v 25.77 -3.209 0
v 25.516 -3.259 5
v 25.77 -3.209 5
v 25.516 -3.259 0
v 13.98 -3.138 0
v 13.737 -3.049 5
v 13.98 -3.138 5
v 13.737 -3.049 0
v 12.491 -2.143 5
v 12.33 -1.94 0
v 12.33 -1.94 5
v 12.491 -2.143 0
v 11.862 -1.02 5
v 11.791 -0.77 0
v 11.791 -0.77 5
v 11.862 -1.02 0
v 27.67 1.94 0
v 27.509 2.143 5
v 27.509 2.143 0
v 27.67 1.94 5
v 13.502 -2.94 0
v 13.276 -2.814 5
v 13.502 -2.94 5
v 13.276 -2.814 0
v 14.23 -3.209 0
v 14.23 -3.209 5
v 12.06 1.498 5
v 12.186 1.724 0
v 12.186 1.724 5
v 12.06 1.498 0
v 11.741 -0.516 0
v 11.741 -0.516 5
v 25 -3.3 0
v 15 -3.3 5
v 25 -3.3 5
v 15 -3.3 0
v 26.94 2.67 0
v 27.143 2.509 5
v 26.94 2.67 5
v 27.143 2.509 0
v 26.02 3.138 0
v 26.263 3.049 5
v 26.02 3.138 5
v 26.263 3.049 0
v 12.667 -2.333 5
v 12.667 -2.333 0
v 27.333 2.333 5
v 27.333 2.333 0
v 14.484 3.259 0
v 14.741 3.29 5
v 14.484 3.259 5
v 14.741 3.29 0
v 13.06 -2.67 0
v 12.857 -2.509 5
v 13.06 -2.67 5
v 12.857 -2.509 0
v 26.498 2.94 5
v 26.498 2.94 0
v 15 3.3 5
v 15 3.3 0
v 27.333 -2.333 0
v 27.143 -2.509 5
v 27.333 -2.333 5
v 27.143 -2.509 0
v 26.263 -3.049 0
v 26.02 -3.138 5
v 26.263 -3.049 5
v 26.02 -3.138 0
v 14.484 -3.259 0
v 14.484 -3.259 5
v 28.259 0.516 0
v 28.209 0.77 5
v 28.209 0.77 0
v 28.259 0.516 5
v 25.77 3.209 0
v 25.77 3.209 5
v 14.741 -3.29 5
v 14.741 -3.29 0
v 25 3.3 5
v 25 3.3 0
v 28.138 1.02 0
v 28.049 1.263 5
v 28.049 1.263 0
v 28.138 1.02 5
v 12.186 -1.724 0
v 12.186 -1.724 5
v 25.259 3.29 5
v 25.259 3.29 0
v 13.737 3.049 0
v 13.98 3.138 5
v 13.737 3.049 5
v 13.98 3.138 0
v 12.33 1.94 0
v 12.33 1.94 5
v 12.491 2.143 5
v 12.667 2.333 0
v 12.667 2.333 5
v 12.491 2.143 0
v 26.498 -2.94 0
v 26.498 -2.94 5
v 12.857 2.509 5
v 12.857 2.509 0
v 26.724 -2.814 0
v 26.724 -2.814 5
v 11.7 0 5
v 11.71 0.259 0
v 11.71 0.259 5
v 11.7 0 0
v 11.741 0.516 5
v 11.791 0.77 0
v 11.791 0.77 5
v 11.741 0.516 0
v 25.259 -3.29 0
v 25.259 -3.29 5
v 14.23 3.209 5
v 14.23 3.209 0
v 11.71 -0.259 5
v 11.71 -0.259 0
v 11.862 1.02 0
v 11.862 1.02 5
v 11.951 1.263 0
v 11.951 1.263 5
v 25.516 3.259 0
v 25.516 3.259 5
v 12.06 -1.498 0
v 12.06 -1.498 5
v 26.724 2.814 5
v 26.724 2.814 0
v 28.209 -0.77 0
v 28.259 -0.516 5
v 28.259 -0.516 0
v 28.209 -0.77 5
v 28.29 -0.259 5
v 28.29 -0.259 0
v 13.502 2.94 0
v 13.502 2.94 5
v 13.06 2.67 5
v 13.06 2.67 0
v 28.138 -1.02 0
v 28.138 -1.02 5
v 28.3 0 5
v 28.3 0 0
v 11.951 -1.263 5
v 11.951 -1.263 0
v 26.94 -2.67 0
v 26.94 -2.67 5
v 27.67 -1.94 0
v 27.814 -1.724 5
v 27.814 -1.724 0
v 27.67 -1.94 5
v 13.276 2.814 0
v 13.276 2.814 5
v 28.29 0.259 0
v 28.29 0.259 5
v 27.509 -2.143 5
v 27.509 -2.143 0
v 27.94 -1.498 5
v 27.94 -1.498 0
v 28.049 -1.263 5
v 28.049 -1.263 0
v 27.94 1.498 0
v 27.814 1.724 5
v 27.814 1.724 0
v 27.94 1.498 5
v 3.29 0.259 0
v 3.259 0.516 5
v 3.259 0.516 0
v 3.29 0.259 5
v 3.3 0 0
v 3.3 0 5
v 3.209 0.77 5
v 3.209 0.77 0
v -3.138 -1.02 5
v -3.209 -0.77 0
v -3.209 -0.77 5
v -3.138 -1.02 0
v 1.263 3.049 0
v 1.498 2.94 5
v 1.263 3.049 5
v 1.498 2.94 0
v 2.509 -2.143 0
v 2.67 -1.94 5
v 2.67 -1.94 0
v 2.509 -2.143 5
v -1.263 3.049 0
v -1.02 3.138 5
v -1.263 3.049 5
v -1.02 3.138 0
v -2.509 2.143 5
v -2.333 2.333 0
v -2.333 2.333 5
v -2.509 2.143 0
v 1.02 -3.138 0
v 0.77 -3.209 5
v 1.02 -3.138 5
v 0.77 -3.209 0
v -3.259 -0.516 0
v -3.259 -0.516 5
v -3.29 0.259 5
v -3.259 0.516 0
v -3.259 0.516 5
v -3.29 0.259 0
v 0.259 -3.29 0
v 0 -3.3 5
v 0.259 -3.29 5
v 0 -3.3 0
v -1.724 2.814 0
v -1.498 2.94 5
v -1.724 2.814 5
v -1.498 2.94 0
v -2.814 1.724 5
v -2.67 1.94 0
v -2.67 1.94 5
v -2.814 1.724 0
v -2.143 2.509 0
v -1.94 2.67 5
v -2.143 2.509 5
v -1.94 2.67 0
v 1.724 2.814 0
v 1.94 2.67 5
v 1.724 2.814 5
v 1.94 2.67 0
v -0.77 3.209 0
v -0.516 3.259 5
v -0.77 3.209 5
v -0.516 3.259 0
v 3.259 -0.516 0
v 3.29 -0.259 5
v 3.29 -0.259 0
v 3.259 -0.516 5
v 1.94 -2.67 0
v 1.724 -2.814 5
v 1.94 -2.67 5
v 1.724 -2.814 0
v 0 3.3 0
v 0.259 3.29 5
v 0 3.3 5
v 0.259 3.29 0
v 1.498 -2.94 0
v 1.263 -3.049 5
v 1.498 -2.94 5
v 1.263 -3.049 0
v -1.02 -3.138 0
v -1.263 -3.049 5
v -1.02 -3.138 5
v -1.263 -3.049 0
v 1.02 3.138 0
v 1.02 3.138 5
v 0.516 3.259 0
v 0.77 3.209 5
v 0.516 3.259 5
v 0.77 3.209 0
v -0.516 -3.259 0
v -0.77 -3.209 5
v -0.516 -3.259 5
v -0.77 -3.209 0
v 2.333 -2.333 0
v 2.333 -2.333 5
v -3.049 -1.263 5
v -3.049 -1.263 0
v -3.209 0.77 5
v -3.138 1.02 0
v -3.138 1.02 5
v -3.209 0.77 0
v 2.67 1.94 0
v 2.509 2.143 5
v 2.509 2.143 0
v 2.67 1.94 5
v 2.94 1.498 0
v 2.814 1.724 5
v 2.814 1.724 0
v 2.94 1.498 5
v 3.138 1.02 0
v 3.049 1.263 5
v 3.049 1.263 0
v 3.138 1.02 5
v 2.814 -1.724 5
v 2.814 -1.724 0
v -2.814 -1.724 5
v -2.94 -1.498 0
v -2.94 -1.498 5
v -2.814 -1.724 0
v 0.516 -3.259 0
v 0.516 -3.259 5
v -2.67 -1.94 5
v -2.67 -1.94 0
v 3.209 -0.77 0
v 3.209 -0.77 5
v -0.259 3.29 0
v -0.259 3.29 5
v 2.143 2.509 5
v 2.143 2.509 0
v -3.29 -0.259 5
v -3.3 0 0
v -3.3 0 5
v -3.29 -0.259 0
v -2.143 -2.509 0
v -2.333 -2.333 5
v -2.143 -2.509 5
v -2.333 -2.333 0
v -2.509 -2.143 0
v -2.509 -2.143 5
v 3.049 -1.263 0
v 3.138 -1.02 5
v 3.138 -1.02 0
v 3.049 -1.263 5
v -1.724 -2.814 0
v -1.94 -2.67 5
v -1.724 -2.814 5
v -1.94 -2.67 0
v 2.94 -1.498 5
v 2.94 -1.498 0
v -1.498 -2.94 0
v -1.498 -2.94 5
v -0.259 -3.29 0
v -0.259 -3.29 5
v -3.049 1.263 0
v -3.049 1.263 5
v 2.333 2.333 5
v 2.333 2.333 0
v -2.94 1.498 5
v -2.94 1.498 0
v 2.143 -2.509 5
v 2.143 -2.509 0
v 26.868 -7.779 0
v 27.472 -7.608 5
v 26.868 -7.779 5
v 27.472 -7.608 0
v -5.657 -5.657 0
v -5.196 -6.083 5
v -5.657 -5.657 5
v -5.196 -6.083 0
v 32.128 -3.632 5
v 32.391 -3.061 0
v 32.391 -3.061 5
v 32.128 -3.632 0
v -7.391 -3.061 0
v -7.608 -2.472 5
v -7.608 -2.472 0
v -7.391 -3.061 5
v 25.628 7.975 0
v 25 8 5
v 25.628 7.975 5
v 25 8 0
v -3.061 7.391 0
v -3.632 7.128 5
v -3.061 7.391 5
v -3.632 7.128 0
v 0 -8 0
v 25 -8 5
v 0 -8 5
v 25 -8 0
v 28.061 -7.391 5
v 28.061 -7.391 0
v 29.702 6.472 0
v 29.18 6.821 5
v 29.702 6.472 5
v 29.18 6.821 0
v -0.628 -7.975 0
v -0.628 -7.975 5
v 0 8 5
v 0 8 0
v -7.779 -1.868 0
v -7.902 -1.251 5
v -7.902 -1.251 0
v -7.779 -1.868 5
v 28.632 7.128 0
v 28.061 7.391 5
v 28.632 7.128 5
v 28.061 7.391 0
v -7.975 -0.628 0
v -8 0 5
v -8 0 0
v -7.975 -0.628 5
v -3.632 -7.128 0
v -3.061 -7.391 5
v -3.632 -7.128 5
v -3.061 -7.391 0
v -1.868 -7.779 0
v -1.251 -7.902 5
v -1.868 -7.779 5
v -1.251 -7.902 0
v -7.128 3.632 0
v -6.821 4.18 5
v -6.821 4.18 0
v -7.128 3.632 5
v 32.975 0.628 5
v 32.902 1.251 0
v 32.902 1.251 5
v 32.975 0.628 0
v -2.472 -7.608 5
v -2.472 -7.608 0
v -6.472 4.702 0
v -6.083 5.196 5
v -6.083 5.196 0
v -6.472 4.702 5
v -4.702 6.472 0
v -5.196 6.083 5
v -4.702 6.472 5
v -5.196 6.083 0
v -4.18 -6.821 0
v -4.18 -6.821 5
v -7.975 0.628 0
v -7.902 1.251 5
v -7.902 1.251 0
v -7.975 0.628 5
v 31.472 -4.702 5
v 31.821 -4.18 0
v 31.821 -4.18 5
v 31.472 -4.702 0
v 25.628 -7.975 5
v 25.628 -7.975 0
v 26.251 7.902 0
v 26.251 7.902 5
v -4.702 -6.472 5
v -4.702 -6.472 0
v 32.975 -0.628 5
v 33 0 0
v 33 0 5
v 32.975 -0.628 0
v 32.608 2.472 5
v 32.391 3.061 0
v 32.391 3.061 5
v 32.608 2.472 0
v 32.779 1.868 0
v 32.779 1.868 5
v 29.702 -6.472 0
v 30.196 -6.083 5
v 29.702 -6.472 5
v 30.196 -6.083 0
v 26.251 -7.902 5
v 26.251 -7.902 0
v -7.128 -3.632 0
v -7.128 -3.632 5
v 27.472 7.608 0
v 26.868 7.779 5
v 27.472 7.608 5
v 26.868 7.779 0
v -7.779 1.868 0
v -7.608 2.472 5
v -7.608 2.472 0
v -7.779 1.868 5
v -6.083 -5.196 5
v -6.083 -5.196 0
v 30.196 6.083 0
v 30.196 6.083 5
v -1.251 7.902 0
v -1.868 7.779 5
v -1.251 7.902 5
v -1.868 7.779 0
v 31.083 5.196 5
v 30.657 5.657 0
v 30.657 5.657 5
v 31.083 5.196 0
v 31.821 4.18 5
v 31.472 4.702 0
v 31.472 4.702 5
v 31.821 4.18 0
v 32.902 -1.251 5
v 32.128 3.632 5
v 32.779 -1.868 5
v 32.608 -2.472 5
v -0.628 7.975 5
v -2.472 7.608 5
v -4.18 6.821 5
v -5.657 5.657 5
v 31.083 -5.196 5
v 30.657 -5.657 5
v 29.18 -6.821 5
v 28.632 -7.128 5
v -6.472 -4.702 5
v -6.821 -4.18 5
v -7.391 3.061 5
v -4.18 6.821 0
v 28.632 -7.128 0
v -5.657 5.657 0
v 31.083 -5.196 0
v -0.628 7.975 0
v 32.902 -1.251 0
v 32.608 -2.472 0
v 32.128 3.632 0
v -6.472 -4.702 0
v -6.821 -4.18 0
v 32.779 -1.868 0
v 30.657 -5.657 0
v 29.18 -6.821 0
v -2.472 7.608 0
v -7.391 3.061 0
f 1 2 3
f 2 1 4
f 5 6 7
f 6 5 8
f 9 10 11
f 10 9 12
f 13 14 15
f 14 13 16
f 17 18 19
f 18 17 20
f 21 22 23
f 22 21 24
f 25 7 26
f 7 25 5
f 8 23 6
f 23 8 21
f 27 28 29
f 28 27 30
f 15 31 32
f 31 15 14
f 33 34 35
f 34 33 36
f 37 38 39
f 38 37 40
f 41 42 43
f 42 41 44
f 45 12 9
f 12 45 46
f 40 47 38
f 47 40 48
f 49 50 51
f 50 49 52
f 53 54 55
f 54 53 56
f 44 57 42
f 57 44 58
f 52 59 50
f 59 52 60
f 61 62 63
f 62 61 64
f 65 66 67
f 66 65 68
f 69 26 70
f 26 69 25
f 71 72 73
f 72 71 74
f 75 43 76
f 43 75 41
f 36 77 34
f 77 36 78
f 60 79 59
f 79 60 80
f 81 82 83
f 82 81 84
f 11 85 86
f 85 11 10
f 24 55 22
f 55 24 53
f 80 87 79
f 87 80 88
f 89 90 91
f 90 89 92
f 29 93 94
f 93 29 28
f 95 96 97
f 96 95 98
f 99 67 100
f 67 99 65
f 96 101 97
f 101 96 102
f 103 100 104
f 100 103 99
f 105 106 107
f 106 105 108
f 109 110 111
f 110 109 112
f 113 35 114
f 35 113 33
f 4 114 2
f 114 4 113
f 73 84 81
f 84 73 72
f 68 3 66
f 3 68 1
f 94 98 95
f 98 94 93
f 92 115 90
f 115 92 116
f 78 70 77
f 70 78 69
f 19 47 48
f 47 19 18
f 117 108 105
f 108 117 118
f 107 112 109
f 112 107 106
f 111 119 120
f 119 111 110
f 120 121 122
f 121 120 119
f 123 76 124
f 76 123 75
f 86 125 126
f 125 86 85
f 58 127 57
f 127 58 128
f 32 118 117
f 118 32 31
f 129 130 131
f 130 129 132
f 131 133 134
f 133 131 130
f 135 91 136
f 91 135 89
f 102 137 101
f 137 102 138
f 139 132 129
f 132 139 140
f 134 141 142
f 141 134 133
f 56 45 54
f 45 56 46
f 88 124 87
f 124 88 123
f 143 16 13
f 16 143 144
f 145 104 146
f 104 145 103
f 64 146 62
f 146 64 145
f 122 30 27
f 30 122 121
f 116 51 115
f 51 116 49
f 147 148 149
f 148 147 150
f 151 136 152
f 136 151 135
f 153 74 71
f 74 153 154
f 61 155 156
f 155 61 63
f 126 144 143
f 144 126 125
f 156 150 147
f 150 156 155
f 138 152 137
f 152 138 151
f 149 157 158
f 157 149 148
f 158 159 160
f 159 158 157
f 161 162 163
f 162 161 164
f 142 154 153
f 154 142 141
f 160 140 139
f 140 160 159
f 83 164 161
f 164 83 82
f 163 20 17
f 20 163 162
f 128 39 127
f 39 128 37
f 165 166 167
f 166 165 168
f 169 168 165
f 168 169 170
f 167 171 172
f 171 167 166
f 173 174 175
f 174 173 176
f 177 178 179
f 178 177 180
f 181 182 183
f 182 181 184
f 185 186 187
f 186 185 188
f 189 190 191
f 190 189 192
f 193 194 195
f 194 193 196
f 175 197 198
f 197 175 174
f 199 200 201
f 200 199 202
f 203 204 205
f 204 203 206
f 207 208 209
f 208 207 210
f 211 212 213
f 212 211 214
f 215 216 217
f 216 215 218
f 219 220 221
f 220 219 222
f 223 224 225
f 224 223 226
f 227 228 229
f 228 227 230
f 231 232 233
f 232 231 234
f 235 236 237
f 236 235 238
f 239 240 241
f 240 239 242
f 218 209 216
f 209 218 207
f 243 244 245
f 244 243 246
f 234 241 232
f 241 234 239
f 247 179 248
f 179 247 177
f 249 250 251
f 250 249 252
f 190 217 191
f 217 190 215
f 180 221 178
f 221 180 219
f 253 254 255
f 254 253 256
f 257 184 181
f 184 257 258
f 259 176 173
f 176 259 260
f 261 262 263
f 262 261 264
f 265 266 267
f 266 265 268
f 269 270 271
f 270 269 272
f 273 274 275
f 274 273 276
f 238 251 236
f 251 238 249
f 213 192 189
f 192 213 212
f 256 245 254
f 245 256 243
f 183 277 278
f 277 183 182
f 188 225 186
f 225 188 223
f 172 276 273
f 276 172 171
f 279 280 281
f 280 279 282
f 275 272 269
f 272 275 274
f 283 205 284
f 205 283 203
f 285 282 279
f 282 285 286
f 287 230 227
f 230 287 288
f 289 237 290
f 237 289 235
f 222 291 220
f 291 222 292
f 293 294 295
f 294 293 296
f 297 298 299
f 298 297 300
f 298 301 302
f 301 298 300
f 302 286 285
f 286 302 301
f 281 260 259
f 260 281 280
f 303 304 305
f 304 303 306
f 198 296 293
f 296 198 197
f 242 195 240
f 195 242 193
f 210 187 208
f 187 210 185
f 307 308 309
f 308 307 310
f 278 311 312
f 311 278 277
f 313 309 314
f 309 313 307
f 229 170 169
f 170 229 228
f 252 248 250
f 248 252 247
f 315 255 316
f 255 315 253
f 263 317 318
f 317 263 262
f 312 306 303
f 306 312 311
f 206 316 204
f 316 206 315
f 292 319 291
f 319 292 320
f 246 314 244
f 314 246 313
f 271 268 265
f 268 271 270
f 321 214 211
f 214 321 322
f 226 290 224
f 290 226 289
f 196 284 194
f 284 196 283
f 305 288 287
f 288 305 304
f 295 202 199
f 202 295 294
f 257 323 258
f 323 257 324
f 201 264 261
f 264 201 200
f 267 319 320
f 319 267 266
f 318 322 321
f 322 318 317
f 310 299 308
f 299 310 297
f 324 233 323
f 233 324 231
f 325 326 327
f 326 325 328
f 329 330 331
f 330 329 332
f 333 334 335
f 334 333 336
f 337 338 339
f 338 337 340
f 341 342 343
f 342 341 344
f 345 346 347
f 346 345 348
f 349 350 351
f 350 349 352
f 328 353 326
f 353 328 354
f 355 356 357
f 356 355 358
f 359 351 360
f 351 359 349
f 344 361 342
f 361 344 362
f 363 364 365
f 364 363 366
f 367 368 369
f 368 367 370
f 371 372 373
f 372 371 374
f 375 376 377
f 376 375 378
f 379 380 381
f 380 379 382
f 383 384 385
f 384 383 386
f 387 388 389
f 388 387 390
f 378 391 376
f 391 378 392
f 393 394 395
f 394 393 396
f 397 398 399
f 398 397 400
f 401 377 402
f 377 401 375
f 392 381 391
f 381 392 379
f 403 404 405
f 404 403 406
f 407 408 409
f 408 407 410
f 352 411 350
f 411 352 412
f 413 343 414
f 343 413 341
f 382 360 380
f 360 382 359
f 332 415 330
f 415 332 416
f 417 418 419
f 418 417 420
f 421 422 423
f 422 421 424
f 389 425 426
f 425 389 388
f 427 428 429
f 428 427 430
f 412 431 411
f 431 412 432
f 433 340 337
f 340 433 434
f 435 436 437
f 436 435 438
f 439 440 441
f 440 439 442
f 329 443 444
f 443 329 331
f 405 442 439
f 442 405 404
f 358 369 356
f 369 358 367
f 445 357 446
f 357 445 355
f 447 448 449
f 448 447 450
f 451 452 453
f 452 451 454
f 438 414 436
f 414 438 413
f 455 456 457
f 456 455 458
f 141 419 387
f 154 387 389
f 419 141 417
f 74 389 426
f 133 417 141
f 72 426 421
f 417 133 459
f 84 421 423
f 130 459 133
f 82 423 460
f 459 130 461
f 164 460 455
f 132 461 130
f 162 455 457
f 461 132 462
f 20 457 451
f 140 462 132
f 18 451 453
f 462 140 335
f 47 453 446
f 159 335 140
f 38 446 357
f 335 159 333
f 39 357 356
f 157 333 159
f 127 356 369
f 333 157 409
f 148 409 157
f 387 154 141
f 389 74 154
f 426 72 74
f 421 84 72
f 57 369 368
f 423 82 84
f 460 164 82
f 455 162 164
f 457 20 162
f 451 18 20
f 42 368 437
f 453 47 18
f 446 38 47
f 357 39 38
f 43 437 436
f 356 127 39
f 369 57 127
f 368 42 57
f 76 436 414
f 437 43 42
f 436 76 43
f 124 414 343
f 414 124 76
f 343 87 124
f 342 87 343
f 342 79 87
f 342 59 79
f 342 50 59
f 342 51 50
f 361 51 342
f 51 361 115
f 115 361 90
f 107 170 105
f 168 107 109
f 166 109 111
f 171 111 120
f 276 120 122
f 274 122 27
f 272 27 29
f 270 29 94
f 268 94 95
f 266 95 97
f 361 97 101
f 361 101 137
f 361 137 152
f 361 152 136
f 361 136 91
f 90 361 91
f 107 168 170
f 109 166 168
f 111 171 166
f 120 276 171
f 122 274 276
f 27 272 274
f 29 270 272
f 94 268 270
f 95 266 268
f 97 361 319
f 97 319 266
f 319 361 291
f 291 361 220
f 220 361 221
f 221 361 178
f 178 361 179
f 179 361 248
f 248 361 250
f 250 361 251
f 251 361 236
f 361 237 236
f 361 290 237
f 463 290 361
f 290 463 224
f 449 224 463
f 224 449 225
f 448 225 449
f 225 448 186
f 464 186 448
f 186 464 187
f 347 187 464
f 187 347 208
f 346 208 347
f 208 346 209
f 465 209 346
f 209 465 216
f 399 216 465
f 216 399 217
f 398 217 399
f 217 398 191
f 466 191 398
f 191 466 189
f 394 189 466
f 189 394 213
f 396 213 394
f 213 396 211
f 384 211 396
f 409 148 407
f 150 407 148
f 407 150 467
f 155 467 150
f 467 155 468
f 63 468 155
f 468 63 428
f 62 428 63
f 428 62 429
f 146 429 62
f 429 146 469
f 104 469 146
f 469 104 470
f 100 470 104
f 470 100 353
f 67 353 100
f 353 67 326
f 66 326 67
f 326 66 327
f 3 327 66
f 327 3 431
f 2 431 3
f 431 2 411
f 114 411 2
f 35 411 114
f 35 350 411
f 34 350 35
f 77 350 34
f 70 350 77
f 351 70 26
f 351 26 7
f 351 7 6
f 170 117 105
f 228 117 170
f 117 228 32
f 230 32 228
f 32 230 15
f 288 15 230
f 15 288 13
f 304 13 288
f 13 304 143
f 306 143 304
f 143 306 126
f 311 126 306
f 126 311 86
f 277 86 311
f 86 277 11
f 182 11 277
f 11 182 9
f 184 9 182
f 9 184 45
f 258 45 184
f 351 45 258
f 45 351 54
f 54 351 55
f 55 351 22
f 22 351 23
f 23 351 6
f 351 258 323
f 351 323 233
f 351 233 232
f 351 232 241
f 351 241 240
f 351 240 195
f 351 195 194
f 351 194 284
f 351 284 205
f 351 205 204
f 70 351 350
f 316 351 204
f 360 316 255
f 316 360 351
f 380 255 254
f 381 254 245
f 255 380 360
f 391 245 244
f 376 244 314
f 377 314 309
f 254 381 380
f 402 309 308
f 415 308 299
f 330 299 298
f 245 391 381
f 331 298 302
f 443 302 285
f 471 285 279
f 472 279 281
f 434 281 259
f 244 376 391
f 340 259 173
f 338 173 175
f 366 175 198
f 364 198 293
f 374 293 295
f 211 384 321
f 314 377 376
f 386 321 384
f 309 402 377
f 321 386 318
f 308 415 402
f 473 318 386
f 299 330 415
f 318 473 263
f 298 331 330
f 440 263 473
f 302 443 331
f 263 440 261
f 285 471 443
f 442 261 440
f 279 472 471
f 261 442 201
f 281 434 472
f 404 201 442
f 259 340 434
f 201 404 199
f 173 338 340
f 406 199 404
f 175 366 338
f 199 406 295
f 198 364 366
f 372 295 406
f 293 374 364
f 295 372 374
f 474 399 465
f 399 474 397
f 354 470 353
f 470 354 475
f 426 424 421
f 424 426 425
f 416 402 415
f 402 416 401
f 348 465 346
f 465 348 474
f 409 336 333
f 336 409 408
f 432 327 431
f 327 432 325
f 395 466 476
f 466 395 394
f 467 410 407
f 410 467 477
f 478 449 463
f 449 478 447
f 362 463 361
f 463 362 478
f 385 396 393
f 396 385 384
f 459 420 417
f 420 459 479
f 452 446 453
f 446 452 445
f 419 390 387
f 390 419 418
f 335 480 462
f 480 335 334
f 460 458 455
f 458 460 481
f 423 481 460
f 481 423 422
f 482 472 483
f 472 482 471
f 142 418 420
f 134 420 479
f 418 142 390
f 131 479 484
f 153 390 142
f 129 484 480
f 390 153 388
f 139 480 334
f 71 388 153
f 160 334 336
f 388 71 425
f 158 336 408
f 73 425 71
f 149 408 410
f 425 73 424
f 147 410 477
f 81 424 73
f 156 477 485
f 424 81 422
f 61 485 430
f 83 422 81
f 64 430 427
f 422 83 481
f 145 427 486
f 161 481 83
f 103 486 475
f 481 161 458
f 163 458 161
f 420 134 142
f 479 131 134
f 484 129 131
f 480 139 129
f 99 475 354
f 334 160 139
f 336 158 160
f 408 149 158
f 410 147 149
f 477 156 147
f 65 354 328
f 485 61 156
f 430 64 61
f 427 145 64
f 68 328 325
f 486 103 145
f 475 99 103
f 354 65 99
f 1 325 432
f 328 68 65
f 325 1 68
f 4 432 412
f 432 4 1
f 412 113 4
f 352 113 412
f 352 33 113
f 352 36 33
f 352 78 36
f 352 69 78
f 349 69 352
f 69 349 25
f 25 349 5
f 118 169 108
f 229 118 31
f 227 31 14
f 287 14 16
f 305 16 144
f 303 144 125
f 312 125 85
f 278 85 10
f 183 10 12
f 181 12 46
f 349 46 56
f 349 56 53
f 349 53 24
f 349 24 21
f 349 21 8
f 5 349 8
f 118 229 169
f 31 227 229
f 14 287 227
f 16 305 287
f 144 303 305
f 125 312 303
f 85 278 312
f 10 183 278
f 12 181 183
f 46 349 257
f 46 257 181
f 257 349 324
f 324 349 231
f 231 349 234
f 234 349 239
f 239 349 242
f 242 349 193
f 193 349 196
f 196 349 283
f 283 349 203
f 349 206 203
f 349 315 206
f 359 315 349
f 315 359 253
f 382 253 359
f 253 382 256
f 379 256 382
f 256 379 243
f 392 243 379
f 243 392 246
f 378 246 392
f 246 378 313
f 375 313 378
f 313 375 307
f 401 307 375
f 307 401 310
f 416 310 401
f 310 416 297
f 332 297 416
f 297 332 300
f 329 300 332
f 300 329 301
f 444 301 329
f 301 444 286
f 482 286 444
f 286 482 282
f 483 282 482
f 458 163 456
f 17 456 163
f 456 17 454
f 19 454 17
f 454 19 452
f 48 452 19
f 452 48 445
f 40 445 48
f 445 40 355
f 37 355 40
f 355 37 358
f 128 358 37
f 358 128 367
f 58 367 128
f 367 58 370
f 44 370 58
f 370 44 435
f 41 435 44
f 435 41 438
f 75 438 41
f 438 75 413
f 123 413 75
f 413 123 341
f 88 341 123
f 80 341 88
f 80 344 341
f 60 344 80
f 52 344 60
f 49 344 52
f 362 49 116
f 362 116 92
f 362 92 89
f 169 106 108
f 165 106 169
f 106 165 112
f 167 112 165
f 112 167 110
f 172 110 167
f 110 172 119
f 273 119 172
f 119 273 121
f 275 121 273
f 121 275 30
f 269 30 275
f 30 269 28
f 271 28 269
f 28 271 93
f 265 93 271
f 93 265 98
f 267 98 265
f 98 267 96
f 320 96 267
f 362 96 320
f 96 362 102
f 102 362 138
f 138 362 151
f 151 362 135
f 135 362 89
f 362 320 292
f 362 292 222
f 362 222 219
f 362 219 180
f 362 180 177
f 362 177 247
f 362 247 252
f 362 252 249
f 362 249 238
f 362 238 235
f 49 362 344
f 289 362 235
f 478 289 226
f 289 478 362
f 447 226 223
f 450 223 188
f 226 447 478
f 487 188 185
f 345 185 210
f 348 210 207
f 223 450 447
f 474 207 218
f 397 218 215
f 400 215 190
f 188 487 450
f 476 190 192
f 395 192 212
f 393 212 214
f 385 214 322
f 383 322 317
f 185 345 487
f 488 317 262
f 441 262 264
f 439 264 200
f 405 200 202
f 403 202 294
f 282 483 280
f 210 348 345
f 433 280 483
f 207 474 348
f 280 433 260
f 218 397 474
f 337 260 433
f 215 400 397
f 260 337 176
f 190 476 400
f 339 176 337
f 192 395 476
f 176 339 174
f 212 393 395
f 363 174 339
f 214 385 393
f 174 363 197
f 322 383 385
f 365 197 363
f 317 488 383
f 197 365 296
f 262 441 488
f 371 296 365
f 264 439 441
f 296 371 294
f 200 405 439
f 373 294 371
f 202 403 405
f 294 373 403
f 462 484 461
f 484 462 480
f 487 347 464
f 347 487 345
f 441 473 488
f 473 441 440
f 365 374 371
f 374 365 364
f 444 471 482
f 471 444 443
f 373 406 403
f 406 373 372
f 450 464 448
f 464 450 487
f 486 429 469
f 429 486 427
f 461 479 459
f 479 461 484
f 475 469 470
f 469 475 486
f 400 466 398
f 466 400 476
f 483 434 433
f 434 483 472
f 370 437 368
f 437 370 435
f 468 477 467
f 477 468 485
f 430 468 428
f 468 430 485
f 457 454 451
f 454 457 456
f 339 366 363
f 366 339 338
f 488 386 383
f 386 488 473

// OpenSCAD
$fn=80;

difference()
{
  hull()
  {
    for(dx=[0,25])
      translate([dx,0,0])
        cylinder(r=8, h=5);
  }
  
  union()
  {
    hull()
    {
      for(dx=[15,25])
        translate([dx,0,-1])
          cylinder(r=3.3, h=5+2*1);
    }
    translate([0,0,-1])
      cylinder(r=3.3, h=5+2*1);
  }
}
